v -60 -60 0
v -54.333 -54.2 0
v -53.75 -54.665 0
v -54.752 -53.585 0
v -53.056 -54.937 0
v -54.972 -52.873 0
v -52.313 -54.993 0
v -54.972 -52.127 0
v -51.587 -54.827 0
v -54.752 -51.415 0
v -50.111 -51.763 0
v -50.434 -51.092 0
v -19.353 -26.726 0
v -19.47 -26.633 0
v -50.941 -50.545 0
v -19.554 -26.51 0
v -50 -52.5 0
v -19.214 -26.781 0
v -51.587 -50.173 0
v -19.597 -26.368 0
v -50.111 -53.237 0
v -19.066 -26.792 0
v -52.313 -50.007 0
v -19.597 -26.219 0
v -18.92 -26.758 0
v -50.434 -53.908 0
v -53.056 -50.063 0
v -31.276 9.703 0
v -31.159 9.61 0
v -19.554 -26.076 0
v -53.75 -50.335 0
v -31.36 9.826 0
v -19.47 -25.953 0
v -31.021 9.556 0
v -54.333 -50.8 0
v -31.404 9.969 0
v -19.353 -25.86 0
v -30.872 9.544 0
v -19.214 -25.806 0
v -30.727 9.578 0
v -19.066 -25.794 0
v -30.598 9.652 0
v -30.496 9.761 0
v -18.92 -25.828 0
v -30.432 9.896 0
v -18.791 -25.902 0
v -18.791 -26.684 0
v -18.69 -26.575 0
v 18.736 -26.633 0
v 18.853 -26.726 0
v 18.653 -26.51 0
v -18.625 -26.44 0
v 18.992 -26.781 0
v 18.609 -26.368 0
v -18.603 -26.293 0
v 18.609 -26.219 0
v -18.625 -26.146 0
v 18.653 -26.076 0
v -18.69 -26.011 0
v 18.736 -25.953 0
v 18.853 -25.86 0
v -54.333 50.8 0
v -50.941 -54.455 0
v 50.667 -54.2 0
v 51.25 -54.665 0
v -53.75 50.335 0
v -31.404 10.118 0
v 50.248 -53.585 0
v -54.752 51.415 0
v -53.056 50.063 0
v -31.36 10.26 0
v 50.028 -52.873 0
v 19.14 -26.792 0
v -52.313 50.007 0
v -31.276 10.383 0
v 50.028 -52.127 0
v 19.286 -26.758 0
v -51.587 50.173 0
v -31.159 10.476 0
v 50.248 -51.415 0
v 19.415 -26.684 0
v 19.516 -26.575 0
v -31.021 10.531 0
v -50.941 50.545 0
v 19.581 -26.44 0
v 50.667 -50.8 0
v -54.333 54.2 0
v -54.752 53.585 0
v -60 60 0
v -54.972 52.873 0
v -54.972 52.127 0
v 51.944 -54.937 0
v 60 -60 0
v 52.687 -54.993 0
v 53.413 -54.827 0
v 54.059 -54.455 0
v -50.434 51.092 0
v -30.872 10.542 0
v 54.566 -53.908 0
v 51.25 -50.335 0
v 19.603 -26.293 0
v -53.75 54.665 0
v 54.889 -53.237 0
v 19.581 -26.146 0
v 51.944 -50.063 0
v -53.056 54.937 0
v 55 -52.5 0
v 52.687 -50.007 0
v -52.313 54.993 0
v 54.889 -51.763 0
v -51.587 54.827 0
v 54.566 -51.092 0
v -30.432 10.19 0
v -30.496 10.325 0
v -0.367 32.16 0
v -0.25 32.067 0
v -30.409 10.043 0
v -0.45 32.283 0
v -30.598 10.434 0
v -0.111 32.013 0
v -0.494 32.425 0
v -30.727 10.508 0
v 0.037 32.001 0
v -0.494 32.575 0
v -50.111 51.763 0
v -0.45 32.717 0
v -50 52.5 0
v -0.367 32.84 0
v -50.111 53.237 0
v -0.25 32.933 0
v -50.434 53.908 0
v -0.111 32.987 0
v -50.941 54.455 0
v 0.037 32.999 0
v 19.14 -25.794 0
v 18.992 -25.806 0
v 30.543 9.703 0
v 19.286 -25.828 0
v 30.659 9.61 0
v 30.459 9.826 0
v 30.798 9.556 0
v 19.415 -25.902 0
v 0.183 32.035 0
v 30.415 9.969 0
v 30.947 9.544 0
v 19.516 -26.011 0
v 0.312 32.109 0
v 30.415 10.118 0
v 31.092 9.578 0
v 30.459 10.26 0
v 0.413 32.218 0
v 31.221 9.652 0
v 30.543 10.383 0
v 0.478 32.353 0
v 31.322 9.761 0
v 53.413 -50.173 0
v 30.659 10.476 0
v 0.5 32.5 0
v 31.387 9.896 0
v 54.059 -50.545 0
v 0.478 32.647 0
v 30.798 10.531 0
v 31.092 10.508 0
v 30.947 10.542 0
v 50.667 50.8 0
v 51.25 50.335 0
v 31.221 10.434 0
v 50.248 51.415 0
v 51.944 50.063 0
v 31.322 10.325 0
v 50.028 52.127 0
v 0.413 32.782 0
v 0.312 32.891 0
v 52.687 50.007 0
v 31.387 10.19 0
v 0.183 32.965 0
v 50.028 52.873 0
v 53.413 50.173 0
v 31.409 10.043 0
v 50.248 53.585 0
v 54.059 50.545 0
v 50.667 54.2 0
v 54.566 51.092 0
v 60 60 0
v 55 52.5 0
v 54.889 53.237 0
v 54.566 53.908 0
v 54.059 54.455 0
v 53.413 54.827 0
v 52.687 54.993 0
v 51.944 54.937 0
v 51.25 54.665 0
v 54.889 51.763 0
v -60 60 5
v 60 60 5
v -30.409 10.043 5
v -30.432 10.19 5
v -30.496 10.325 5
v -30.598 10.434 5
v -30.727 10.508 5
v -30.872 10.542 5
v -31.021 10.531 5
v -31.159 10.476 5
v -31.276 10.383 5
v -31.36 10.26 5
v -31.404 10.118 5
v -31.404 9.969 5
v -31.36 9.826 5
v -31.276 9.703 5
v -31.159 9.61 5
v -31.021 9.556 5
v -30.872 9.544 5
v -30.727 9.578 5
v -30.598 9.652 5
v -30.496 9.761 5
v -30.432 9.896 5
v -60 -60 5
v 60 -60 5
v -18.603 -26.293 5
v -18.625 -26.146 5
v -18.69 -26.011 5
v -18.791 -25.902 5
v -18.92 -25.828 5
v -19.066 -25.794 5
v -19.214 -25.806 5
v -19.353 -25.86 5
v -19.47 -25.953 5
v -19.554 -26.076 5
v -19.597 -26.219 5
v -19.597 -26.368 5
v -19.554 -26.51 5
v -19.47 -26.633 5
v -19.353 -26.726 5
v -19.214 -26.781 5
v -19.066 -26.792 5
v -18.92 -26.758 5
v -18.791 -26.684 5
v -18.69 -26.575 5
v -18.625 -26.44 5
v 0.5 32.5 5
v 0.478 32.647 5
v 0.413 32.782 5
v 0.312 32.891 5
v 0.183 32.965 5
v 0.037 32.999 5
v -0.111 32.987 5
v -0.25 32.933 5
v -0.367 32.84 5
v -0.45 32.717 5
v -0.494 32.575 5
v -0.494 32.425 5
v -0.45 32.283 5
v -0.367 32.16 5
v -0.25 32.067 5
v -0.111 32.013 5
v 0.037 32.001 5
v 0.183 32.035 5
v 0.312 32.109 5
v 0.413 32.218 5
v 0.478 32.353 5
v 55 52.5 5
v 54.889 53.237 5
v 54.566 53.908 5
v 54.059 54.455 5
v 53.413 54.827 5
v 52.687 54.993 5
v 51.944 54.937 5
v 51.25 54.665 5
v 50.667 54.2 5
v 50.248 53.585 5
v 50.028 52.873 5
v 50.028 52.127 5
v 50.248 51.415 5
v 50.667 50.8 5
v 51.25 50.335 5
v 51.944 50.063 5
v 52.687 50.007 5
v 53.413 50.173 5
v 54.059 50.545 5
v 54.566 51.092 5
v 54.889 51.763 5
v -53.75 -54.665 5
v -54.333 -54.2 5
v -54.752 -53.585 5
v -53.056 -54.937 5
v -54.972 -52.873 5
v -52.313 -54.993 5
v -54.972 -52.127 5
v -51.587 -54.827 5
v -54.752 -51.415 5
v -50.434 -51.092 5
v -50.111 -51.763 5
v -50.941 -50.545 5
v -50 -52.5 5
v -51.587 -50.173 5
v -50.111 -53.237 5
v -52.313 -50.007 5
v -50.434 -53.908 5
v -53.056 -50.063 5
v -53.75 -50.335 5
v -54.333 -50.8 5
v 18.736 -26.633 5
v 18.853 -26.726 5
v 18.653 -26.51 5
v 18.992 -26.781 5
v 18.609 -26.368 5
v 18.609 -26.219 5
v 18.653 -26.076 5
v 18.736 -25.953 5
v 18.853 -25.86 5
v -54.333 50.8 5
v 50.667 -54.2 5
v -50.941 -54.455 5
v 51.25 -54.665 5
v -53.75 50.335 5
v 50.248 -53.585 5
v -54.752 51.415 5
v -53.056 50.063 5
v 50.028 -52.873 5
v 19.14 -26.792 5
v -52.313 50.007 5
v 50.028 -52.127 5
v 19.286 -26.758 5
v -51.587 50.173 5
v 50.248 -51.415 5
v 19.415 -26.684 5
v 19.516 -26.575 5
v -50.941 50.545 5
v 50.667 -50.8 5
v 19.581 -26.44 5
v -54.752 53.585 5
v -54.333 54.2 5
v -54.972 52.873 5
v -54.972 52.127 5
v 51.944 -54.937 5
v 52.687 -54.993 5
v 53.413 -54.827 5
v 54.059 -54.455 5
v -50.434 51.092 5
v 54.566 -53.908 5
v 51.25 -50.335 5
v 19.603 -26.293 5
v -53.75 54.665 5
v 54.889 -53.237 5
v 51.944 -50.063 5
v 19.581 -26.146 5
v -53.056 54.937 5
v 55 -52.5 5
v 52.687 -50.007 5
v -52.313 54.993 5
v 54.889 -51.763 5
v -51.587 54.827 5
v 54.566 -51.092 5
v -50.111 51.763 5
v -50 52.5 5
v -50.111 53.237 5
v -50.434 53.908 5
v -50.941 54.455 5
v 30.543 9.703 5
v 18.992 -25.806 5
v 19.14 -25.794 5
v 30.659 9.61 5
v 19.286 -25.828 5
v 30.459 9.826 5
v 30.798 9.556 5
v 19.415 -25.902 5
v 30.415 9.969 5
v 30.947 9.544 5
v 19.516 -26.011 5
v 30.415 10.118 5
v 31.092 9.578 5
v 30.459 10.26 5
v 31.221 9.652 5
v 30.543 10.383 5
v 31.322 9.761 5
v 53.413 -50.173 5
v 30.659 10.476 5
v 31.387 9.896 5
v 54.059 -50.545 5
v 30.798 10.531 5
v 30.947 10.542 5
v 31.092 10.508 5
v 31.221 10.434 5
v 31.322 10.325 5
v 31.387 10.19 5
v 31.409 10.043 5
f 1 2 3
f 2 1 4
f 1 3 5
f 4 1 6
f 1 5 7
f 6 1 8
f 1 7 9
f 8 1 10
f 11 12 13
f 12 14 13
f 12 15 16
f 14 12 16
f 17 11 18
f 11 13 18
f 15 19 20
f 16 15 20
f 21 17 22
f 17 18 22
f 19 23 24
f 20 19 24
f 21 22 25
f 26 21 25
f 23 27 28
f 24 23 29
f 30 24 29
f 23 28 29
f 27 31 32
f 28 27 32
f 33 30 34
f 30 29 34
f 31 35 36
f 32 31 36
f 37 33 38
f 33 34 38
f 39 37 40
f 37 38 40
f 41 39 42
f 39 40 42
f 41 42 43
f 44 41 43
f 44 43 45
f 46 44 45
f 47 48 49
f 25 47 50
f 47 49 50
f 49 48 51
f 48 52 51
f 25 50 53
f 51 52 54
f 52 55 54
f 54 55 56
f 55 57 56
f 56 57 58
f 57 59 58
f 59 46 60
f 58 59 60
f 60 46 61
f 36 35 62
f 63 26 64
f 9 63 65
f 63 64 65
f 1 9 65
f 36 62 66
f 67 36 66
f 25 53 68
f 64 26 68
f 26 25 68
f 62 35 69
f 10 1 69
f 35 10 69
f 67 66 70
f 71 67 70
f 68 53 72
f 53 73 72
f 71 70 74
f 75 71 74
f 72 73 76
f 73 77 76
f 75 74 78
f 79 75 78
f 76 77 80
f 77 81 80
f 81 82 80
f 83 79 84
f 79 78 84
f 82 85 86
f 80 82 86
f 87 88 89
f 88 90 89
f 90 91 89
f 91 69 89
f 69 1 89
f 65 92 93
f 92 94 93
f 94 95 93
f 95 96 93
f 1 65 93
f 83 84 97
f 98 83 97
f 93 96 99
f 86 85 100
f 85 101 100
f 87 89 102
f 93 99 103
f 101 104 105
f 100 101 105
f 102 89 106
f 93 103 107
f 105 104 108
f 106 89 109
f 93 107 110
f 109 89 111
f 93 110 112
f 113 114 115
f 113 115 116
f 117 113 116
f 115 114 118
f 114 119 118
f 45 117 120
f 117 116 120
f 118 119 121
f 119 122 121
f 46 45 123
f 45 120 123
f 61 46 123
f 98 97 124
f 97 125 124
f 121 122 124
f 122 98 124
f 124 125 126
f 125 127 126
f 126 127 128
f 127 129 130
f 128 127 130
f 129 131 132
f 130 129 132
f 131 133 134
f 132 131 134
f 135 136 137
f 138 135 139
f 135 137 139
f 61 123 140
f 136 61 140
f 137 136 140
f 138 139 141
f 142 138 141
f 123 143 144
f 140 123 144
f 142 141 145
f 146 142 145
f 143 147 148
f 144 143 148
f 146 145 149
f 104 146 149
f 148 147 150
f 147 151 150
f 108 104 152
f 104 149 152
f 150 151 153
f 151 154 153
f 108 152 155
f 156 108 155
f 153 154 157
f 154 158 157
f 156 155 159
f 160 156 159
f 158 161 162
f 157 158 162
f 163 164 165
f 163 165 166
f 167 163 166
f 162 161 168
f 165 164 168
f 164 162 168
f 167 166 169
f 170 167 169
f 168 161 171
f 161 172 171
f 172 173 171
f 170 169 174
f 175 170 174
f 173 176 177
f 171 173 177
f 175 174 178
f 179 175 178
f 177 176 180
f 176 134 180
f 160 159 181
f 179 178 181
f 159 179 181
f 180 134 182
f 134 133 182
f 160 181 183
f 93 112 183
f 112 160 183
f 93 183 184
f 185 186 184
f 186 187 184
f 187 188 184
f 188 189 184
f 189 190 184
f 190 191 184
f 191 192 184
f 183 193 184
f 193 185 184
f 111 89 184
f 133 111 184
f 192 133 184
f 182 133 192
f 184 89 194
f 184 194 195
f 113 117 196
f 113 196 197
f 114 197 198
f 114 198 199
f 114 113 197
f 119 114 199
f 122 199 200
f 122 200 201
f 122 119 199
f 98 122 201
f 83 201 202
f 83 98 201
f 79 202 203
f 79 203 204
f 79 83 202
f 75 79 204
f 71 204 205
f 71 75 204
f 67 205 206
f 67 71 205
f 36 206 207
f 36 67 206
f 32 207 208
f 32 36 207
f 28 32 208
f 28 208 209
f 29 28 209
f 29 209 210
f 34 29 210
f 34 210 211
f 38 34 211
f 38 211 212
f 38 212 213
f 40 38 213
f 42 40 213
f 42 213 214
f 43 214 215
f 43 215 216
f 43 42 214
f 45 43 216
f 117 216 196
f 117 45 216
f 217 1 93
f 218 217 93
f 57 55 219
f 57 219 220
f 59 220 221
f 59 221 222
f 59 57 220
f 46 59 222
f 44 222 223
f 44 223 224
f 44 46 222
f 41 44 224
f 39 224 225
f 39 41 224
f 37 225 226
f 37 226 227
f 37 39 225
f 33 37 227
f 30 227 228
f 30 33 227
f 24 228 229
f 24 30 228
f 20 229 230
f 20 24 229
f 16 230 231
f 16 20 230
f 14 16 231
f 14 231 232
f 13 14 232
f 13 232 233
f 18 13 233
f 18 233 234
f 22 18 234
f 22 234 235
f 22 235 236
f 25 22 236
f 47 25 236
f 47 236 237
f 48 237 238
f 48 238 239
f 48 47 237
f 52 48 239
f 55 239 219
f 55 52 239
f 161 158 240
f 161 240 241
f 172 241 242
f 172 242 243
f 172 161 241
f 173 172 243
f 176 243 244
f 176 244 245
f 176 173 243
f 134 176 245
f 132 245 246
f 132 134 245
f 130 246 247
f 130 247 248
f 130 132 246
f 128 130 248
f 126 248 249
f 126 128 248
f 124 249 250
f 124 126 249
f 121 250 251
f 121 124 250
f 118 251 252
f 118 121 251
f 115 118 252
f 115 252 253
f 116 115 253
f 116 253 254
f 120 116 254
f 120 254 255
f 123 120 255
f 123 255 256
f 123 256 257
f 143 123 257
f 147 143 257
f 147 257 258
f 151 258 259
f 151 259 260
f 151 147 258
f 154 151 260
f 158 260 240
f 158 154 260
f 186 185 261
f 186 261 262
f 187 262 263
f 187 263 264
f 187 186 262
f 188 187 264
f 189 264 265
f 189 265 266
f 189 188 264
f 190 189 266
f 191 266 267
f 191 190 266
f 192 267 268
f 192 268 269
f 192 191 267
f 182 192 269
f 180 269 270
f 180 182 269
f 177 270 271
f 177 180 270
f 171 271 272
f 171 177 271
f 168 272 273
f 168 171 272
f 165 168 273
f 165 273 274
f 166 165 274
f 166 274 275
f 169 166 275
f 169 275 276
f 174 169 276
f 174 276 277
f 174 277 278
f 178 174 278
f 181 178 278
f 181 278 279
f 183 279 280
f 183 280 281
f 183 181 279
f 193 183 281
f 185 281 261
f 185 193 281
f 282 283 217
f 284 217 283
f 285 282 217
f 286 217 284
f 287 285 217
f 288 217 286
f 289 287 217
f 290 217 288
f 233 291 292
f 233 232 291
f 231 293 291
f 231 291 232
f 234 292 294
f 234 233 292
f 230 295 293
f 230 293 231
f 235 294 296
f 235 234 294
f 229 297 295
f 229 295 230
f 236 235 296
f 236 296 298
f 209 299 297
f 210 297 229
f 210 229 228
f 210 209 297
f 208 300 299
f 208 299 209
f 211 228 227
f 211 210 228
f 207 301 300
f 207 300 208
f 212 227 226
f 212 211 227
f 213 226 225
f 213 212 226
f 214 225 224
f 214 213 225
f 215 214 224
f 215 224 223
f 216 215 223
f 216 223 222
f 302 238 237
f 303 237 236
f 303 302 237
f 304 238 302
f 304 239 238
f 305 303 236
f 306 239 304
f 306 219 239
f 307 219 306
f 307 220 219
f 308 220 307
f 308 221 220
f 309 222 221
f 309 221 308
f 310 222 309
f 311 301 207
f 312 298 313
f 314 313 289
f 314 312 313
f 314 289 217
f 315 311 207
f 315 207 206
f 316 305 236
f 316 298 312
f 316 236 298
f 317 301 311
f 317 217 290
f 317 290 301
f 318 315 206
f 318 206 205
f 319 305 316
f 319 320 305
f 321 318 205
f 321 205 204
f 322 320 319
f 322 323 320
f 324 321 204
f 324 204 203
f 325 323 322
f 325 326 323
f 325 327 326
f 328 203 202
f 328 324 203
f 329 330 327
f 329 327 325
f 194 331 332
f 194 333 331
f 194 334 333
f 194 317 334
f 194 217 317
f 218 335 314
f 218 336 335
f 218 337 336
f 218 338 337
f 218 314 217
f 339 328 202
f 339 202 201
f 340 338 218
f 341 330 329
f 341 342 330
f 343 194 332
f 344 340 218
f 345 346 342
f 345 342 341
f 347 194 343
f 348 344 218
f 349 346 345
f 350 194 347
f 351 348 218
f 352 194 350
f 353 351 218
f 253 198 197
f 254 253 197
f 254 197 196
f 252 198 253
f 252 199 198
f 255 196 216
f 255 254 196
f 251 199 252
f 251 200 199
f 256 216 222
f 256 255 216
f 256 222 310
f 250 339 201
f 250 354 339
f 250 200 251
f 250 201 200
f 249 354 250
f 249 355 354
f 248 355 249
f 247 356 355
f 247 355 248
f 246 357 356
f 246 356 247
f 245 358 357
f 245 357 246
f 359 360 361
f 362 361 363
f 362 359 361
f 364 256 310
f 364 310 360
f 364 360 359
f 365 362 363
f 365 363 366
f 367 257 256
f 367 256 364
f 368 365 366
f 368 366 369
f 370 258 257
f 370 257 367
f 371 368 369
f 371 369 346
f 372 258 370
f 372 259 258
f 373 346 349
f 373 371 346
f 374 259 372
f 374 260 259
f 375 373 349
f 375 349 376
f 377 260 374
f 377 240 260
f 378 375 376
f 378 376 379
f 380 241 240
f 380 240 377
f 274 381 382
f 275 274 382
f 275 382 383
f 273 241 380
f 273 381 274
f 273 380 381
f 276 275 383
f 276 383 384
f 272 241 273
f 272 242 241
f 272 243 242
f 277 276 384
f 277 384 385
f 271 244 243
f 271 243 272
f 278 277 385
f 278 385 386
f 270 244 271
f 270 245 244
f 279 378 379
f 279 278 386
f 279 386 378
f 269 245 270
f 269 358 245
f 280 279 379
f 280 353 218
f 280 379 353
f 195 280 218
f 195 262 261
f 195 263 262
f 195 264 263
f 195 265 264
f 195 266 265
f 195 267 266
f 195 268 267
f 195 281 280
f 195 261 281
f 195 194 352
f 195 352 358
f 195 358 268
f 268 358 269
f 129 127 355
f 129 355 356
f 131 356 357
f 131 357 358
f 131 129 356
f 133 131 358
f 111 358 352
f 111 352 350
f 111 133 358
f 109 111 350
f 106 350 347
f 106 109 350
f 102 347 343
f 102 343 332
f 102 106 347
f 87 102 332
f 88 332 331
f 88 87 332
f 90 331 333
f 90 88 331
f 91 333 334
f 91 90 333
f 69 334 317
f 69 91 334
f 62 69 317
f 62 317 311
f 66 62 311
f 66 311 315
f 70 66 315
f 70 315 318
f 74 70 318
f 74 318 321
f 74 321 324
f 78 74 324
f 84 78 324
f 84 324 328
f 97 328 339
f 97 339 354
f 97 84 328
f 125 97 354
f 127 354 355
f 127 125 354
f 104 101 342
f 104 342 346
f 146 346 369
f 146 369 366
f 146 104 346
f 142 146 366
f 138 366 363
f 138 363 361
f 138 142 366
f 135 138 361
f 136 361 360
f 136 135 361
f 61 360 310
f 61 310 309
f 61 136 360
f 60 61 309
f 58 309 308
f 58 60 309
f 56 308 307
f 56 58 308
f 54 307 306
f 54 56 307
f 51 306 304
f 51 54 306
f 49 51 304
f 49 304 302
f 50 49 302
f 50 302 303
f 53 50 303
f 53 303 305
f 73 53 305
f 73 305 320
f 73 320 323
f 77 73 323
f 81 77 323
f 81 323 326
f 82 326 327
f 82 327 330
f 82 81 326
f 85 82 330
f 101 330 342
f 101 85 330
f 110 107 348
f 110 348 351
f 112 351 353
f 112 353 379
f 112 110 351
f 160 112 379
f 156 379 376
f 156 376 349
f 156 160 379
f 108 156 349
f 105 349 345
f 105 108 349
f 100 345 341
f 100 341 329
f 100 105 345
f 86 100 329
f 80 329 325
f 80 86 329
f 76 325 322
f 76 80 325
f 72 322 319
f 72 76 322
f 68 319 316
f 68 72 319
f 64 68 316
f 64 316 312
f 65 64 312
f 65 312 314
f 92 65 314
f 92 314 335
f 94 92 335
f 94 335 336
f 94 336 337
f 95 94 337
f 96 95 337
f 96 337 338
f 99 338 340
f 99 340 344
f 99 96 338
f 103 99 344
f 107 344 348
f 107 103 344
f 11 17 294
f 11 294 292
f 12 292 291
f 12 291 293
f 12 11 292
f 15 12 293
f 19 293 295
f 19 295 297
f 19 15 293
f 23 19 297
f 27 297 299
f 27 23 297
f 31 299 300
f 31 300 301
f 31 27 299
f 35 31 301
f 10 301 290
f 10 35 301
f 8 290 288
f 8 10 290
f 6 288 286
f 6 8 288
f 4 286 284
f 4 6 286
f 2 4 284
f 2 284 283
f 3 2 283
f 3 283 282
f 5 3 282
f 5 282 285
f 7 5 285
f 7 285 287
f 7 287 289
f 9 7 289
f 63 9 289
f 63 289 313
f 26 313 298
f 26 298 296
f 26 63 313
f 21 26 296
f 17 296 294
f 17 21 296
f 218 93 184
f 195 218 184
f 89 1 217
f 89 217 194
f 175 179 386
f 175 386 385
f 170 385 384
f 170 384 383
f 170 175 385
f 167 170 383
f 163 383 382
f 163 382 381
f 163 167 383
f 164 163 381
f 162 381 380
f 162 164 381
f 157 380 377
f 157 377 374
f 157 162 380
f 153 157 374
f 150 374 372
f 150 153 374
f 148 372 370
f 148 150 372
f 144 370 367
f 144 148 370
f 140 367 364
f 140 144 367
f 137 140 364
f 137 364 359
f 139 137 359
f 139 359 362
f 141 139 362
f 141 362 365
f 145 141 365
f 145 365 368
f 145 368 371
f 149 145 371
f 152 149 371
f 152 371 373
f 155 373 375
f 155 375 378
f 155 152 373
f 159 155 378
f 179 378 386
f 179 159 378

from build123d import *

# Parameters (mm, degrees)
F0_W     = 120
F0_H     = 120
F0_R     = 2.5
F0_R_2   = 0.5
F1_DEPTH = 5


with BuildPart() as f1:
    # F0 (on Top) → F1 (new body)
    with BuildSketch(Plane.XY):
        Rectangle(F0_W, F0_H)
        with Locations((-52.5, -52.5)):
            Circle(F0_R, mode=Mode.SUBTRACT)
        with Locations((-19.103021, -26.293052)):
            Circle(F0_R_2, mode=Mode.SUBTRACT)
        with Locations((52.5, -52.5)):
            Circle(F0_R, mode=Mode.SUBTRACT)
        with Locations((19.103021, -26.293052)):
            Circle(F0_R_2, mode=Mode.SUBTRACT)
        with Locations((-30.909337, 10.043052)):
            Circle(F0_R_2, mode=Mode.SUBTRACT)
        with Locations((-52.5, 52.5)):
            Circle(F0_R, mode=Mode.SUBTRACT)
        with Locations((30.909337, 10.043052)):
            Circle(F0_R_2, mode=Mode.SUBTRACT)
        with Locations((0, 32.5)):
            Circle(F0_R_2, mode=Mode.SUBTRACT)
        with Locations((52.5, 52.5)):
            Circle(F0_R, mode=Mode.SUBTRACT)
    extrude(amount=F1_DEPTH)


solid = f1.part
